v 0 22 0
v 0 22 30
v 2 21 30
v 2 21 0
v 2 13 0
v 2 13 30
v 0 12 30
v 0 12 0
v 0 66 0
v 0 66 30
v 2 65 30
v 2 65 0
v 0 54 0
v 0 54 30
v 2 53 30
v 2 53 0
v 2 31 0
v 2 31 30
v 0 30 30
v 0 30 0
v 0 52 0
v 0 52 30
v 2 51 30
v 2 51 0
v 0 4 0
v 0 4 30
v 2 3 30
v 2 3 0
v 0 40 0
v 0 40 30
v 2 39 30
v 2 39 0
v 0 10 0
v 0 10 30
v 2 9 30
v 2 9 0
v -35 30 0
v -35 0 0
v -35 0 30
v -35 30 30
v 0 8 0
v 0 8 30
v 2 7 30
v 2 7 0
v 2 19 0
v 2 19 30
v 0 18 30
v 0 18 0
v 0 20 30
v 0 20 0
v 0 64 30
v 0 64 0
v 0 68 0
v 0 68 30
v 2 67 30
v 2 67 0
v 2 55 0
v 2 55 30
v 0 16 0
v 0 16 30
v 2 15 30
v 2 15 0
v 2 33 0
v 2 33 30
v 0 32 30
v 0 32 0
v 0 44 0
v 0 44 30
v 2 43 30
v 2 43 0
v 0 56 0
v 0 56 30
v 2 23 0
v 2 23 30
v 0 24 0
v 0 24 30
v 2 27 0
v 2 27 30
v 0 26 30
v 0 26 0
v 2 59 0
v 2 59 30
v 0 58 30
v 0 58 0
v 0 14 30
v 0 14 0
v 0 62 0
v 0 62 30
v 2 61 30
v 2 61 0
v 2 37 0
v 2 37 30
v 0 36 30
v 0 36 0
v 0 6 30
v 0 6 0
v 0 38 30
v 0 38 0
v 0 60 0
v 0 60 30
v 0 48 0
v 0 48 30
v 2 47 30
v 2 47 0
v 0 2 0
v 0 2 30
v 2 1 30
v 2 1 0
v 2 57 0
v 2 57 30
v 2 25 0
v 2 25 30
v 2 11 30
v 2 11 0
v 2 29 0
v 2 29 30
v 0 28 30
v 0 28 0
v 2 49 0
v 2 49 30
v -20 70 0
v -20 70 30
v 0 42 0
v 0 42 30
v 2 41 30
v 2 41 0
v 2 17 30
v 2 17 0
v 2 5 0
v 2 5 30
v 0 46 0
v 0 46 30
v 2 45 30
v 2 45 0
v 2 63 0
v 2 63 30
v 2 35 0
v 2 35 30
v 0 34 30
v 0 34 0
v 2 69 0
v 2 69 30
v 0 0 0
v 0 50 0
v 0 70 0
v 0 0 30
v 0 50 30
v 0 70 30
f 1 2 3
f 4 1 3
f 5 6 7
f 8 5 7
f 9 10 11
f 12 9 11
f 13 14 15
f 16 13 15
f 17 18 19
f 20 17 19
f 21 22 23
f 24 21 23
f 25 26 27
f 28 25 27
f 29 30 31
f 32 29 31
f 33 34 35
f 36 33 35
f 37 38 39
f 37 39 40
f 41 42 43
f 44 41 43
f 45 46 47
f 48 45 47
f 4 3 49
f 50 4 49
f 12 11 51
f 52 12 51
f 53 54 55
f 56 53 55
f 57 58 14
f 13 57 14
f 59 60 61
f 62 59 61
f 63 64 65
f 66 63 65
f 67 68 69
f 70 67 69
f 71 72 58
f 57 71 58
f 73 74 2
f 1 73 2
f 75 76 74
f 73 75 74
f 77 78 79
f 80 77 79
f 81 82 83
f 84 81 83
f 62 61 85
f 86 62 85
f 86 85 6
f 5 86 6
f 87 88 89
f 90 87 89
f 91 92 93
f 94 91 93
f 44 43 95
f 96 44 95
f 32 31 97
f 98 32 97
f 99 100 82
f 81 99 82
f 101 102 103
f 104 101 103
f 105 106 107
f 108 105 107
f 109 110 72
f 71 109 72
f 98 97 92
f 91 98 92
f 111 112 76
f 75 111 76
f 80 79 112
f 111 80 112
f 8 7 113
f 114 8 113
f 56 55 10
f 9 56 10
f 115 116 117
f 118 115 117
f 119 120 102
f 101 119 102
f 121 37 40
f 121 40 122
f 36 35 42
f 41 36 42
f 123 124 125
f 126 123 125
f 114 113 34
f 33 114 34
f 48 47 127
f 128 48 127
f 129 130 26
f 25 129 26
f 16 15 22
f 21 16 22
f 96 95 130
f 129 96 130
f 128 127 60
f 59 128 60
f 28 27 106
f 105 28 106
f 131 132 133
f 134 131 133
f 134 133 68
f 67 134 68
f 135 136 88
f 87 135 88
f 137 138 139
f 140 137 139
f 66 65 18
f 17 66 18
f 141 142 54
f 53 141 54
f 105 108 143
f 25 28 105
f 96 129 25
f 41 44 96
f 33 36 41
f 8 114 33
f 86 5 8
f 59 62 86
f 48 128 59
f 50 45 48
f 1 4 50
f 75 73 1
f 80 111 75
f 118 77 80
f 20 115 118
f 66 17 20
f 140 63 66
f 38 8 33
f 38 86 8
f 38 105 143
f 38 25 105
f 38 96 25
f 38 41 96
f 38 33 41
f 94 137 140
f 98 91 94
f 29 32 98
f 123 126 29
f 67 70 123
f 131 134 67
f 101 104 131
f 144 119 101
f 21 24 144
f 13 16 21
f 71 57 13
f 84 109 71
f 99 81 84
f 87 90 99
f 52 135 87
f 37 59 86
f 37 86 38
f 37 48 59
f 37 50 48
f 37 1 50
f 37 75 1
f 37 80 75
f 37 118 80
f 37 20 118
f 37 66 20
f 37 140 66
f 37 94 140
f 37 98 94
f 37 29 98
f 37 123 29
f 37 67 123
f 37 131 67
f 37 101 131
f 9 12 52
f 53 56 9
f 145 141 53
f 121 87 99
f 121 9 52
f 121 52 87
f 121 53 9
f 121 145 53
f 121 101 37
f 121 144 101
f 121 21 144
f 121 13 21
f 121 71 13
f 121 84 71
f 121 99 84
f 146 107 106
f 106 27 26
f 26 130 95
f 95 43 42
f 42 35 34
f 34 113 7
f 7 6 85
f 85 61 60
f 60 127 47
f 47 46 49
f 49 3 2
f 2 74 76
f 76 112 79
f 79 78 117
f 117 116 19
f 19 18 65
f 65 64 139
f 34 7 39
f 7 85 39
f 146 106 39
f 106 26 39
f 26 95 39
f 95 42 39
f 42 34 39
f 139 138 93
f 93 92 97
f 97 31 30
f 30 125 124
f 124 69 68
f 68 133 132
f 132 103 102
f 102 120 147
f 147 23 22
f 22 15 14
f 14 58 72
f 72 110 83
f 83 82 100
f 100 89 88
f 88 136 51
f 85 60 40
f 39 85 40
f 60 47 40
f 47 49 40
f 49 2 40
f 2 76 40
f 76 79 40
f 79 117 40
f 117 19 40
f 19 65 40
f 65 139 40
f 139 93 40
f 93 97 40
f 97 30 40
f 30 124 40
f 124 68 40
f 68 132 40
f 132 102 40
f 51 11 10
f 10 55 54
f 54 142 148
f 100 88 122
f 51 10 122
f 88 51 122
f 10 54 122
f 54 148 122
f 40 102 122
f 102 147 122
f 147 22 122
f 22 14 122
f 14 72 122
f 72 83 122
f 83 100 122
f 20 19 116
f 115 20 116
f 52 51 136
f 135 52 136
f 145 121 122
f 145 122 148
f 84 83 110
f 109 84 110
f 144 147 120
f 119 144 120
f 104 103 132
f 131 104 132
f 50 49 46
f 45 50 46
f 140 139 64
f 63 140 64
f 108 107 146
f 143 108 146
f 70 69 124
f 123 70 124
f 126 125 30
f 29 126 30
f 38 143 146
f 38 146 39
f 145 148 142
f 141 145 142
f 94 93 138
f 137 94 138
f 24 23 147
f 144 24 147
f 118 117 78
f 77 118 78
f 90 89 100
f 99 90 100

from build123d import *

# Parameters (mm, degrees)
BOSS_EXTRUDE1_DEPTH = 30
BOSS_EXTRUDE3_DEPTH = 30
LPATTERN1_COUNT     = 35
LPATTERN1_PITCH     = 2


with BuildPart() as part:
    # Sketch2 → Boss-Extrude1 (new body)
    with BuildSketch(Plane.XY):
        Polygon((-35, 30), (-20, 70), (0, 70), (0, 0), (-35, 0), align=None)
    extrude(amount=BOSS_EXTRUDE1_DEPTH)

    # Sketch3 → Boss-Extrude3 (add)
    with BuildSketch(Plane.XY.offset(30)):
        Polygon((0, 70), (2, 69), (0, 68), align=None)
    boss_extrude3 = extrude(amount=-BOSS_EXTRUDE3_DEPTH)

    # LPattern1: Boss-Extrude3 ×35
    with Locations(*[(0, -i * LPATTERN1_PITCH, 0) for i in range(1, LPATTERN1_COUNT)]):
        add(boss_extrude3)


solid = part.part
